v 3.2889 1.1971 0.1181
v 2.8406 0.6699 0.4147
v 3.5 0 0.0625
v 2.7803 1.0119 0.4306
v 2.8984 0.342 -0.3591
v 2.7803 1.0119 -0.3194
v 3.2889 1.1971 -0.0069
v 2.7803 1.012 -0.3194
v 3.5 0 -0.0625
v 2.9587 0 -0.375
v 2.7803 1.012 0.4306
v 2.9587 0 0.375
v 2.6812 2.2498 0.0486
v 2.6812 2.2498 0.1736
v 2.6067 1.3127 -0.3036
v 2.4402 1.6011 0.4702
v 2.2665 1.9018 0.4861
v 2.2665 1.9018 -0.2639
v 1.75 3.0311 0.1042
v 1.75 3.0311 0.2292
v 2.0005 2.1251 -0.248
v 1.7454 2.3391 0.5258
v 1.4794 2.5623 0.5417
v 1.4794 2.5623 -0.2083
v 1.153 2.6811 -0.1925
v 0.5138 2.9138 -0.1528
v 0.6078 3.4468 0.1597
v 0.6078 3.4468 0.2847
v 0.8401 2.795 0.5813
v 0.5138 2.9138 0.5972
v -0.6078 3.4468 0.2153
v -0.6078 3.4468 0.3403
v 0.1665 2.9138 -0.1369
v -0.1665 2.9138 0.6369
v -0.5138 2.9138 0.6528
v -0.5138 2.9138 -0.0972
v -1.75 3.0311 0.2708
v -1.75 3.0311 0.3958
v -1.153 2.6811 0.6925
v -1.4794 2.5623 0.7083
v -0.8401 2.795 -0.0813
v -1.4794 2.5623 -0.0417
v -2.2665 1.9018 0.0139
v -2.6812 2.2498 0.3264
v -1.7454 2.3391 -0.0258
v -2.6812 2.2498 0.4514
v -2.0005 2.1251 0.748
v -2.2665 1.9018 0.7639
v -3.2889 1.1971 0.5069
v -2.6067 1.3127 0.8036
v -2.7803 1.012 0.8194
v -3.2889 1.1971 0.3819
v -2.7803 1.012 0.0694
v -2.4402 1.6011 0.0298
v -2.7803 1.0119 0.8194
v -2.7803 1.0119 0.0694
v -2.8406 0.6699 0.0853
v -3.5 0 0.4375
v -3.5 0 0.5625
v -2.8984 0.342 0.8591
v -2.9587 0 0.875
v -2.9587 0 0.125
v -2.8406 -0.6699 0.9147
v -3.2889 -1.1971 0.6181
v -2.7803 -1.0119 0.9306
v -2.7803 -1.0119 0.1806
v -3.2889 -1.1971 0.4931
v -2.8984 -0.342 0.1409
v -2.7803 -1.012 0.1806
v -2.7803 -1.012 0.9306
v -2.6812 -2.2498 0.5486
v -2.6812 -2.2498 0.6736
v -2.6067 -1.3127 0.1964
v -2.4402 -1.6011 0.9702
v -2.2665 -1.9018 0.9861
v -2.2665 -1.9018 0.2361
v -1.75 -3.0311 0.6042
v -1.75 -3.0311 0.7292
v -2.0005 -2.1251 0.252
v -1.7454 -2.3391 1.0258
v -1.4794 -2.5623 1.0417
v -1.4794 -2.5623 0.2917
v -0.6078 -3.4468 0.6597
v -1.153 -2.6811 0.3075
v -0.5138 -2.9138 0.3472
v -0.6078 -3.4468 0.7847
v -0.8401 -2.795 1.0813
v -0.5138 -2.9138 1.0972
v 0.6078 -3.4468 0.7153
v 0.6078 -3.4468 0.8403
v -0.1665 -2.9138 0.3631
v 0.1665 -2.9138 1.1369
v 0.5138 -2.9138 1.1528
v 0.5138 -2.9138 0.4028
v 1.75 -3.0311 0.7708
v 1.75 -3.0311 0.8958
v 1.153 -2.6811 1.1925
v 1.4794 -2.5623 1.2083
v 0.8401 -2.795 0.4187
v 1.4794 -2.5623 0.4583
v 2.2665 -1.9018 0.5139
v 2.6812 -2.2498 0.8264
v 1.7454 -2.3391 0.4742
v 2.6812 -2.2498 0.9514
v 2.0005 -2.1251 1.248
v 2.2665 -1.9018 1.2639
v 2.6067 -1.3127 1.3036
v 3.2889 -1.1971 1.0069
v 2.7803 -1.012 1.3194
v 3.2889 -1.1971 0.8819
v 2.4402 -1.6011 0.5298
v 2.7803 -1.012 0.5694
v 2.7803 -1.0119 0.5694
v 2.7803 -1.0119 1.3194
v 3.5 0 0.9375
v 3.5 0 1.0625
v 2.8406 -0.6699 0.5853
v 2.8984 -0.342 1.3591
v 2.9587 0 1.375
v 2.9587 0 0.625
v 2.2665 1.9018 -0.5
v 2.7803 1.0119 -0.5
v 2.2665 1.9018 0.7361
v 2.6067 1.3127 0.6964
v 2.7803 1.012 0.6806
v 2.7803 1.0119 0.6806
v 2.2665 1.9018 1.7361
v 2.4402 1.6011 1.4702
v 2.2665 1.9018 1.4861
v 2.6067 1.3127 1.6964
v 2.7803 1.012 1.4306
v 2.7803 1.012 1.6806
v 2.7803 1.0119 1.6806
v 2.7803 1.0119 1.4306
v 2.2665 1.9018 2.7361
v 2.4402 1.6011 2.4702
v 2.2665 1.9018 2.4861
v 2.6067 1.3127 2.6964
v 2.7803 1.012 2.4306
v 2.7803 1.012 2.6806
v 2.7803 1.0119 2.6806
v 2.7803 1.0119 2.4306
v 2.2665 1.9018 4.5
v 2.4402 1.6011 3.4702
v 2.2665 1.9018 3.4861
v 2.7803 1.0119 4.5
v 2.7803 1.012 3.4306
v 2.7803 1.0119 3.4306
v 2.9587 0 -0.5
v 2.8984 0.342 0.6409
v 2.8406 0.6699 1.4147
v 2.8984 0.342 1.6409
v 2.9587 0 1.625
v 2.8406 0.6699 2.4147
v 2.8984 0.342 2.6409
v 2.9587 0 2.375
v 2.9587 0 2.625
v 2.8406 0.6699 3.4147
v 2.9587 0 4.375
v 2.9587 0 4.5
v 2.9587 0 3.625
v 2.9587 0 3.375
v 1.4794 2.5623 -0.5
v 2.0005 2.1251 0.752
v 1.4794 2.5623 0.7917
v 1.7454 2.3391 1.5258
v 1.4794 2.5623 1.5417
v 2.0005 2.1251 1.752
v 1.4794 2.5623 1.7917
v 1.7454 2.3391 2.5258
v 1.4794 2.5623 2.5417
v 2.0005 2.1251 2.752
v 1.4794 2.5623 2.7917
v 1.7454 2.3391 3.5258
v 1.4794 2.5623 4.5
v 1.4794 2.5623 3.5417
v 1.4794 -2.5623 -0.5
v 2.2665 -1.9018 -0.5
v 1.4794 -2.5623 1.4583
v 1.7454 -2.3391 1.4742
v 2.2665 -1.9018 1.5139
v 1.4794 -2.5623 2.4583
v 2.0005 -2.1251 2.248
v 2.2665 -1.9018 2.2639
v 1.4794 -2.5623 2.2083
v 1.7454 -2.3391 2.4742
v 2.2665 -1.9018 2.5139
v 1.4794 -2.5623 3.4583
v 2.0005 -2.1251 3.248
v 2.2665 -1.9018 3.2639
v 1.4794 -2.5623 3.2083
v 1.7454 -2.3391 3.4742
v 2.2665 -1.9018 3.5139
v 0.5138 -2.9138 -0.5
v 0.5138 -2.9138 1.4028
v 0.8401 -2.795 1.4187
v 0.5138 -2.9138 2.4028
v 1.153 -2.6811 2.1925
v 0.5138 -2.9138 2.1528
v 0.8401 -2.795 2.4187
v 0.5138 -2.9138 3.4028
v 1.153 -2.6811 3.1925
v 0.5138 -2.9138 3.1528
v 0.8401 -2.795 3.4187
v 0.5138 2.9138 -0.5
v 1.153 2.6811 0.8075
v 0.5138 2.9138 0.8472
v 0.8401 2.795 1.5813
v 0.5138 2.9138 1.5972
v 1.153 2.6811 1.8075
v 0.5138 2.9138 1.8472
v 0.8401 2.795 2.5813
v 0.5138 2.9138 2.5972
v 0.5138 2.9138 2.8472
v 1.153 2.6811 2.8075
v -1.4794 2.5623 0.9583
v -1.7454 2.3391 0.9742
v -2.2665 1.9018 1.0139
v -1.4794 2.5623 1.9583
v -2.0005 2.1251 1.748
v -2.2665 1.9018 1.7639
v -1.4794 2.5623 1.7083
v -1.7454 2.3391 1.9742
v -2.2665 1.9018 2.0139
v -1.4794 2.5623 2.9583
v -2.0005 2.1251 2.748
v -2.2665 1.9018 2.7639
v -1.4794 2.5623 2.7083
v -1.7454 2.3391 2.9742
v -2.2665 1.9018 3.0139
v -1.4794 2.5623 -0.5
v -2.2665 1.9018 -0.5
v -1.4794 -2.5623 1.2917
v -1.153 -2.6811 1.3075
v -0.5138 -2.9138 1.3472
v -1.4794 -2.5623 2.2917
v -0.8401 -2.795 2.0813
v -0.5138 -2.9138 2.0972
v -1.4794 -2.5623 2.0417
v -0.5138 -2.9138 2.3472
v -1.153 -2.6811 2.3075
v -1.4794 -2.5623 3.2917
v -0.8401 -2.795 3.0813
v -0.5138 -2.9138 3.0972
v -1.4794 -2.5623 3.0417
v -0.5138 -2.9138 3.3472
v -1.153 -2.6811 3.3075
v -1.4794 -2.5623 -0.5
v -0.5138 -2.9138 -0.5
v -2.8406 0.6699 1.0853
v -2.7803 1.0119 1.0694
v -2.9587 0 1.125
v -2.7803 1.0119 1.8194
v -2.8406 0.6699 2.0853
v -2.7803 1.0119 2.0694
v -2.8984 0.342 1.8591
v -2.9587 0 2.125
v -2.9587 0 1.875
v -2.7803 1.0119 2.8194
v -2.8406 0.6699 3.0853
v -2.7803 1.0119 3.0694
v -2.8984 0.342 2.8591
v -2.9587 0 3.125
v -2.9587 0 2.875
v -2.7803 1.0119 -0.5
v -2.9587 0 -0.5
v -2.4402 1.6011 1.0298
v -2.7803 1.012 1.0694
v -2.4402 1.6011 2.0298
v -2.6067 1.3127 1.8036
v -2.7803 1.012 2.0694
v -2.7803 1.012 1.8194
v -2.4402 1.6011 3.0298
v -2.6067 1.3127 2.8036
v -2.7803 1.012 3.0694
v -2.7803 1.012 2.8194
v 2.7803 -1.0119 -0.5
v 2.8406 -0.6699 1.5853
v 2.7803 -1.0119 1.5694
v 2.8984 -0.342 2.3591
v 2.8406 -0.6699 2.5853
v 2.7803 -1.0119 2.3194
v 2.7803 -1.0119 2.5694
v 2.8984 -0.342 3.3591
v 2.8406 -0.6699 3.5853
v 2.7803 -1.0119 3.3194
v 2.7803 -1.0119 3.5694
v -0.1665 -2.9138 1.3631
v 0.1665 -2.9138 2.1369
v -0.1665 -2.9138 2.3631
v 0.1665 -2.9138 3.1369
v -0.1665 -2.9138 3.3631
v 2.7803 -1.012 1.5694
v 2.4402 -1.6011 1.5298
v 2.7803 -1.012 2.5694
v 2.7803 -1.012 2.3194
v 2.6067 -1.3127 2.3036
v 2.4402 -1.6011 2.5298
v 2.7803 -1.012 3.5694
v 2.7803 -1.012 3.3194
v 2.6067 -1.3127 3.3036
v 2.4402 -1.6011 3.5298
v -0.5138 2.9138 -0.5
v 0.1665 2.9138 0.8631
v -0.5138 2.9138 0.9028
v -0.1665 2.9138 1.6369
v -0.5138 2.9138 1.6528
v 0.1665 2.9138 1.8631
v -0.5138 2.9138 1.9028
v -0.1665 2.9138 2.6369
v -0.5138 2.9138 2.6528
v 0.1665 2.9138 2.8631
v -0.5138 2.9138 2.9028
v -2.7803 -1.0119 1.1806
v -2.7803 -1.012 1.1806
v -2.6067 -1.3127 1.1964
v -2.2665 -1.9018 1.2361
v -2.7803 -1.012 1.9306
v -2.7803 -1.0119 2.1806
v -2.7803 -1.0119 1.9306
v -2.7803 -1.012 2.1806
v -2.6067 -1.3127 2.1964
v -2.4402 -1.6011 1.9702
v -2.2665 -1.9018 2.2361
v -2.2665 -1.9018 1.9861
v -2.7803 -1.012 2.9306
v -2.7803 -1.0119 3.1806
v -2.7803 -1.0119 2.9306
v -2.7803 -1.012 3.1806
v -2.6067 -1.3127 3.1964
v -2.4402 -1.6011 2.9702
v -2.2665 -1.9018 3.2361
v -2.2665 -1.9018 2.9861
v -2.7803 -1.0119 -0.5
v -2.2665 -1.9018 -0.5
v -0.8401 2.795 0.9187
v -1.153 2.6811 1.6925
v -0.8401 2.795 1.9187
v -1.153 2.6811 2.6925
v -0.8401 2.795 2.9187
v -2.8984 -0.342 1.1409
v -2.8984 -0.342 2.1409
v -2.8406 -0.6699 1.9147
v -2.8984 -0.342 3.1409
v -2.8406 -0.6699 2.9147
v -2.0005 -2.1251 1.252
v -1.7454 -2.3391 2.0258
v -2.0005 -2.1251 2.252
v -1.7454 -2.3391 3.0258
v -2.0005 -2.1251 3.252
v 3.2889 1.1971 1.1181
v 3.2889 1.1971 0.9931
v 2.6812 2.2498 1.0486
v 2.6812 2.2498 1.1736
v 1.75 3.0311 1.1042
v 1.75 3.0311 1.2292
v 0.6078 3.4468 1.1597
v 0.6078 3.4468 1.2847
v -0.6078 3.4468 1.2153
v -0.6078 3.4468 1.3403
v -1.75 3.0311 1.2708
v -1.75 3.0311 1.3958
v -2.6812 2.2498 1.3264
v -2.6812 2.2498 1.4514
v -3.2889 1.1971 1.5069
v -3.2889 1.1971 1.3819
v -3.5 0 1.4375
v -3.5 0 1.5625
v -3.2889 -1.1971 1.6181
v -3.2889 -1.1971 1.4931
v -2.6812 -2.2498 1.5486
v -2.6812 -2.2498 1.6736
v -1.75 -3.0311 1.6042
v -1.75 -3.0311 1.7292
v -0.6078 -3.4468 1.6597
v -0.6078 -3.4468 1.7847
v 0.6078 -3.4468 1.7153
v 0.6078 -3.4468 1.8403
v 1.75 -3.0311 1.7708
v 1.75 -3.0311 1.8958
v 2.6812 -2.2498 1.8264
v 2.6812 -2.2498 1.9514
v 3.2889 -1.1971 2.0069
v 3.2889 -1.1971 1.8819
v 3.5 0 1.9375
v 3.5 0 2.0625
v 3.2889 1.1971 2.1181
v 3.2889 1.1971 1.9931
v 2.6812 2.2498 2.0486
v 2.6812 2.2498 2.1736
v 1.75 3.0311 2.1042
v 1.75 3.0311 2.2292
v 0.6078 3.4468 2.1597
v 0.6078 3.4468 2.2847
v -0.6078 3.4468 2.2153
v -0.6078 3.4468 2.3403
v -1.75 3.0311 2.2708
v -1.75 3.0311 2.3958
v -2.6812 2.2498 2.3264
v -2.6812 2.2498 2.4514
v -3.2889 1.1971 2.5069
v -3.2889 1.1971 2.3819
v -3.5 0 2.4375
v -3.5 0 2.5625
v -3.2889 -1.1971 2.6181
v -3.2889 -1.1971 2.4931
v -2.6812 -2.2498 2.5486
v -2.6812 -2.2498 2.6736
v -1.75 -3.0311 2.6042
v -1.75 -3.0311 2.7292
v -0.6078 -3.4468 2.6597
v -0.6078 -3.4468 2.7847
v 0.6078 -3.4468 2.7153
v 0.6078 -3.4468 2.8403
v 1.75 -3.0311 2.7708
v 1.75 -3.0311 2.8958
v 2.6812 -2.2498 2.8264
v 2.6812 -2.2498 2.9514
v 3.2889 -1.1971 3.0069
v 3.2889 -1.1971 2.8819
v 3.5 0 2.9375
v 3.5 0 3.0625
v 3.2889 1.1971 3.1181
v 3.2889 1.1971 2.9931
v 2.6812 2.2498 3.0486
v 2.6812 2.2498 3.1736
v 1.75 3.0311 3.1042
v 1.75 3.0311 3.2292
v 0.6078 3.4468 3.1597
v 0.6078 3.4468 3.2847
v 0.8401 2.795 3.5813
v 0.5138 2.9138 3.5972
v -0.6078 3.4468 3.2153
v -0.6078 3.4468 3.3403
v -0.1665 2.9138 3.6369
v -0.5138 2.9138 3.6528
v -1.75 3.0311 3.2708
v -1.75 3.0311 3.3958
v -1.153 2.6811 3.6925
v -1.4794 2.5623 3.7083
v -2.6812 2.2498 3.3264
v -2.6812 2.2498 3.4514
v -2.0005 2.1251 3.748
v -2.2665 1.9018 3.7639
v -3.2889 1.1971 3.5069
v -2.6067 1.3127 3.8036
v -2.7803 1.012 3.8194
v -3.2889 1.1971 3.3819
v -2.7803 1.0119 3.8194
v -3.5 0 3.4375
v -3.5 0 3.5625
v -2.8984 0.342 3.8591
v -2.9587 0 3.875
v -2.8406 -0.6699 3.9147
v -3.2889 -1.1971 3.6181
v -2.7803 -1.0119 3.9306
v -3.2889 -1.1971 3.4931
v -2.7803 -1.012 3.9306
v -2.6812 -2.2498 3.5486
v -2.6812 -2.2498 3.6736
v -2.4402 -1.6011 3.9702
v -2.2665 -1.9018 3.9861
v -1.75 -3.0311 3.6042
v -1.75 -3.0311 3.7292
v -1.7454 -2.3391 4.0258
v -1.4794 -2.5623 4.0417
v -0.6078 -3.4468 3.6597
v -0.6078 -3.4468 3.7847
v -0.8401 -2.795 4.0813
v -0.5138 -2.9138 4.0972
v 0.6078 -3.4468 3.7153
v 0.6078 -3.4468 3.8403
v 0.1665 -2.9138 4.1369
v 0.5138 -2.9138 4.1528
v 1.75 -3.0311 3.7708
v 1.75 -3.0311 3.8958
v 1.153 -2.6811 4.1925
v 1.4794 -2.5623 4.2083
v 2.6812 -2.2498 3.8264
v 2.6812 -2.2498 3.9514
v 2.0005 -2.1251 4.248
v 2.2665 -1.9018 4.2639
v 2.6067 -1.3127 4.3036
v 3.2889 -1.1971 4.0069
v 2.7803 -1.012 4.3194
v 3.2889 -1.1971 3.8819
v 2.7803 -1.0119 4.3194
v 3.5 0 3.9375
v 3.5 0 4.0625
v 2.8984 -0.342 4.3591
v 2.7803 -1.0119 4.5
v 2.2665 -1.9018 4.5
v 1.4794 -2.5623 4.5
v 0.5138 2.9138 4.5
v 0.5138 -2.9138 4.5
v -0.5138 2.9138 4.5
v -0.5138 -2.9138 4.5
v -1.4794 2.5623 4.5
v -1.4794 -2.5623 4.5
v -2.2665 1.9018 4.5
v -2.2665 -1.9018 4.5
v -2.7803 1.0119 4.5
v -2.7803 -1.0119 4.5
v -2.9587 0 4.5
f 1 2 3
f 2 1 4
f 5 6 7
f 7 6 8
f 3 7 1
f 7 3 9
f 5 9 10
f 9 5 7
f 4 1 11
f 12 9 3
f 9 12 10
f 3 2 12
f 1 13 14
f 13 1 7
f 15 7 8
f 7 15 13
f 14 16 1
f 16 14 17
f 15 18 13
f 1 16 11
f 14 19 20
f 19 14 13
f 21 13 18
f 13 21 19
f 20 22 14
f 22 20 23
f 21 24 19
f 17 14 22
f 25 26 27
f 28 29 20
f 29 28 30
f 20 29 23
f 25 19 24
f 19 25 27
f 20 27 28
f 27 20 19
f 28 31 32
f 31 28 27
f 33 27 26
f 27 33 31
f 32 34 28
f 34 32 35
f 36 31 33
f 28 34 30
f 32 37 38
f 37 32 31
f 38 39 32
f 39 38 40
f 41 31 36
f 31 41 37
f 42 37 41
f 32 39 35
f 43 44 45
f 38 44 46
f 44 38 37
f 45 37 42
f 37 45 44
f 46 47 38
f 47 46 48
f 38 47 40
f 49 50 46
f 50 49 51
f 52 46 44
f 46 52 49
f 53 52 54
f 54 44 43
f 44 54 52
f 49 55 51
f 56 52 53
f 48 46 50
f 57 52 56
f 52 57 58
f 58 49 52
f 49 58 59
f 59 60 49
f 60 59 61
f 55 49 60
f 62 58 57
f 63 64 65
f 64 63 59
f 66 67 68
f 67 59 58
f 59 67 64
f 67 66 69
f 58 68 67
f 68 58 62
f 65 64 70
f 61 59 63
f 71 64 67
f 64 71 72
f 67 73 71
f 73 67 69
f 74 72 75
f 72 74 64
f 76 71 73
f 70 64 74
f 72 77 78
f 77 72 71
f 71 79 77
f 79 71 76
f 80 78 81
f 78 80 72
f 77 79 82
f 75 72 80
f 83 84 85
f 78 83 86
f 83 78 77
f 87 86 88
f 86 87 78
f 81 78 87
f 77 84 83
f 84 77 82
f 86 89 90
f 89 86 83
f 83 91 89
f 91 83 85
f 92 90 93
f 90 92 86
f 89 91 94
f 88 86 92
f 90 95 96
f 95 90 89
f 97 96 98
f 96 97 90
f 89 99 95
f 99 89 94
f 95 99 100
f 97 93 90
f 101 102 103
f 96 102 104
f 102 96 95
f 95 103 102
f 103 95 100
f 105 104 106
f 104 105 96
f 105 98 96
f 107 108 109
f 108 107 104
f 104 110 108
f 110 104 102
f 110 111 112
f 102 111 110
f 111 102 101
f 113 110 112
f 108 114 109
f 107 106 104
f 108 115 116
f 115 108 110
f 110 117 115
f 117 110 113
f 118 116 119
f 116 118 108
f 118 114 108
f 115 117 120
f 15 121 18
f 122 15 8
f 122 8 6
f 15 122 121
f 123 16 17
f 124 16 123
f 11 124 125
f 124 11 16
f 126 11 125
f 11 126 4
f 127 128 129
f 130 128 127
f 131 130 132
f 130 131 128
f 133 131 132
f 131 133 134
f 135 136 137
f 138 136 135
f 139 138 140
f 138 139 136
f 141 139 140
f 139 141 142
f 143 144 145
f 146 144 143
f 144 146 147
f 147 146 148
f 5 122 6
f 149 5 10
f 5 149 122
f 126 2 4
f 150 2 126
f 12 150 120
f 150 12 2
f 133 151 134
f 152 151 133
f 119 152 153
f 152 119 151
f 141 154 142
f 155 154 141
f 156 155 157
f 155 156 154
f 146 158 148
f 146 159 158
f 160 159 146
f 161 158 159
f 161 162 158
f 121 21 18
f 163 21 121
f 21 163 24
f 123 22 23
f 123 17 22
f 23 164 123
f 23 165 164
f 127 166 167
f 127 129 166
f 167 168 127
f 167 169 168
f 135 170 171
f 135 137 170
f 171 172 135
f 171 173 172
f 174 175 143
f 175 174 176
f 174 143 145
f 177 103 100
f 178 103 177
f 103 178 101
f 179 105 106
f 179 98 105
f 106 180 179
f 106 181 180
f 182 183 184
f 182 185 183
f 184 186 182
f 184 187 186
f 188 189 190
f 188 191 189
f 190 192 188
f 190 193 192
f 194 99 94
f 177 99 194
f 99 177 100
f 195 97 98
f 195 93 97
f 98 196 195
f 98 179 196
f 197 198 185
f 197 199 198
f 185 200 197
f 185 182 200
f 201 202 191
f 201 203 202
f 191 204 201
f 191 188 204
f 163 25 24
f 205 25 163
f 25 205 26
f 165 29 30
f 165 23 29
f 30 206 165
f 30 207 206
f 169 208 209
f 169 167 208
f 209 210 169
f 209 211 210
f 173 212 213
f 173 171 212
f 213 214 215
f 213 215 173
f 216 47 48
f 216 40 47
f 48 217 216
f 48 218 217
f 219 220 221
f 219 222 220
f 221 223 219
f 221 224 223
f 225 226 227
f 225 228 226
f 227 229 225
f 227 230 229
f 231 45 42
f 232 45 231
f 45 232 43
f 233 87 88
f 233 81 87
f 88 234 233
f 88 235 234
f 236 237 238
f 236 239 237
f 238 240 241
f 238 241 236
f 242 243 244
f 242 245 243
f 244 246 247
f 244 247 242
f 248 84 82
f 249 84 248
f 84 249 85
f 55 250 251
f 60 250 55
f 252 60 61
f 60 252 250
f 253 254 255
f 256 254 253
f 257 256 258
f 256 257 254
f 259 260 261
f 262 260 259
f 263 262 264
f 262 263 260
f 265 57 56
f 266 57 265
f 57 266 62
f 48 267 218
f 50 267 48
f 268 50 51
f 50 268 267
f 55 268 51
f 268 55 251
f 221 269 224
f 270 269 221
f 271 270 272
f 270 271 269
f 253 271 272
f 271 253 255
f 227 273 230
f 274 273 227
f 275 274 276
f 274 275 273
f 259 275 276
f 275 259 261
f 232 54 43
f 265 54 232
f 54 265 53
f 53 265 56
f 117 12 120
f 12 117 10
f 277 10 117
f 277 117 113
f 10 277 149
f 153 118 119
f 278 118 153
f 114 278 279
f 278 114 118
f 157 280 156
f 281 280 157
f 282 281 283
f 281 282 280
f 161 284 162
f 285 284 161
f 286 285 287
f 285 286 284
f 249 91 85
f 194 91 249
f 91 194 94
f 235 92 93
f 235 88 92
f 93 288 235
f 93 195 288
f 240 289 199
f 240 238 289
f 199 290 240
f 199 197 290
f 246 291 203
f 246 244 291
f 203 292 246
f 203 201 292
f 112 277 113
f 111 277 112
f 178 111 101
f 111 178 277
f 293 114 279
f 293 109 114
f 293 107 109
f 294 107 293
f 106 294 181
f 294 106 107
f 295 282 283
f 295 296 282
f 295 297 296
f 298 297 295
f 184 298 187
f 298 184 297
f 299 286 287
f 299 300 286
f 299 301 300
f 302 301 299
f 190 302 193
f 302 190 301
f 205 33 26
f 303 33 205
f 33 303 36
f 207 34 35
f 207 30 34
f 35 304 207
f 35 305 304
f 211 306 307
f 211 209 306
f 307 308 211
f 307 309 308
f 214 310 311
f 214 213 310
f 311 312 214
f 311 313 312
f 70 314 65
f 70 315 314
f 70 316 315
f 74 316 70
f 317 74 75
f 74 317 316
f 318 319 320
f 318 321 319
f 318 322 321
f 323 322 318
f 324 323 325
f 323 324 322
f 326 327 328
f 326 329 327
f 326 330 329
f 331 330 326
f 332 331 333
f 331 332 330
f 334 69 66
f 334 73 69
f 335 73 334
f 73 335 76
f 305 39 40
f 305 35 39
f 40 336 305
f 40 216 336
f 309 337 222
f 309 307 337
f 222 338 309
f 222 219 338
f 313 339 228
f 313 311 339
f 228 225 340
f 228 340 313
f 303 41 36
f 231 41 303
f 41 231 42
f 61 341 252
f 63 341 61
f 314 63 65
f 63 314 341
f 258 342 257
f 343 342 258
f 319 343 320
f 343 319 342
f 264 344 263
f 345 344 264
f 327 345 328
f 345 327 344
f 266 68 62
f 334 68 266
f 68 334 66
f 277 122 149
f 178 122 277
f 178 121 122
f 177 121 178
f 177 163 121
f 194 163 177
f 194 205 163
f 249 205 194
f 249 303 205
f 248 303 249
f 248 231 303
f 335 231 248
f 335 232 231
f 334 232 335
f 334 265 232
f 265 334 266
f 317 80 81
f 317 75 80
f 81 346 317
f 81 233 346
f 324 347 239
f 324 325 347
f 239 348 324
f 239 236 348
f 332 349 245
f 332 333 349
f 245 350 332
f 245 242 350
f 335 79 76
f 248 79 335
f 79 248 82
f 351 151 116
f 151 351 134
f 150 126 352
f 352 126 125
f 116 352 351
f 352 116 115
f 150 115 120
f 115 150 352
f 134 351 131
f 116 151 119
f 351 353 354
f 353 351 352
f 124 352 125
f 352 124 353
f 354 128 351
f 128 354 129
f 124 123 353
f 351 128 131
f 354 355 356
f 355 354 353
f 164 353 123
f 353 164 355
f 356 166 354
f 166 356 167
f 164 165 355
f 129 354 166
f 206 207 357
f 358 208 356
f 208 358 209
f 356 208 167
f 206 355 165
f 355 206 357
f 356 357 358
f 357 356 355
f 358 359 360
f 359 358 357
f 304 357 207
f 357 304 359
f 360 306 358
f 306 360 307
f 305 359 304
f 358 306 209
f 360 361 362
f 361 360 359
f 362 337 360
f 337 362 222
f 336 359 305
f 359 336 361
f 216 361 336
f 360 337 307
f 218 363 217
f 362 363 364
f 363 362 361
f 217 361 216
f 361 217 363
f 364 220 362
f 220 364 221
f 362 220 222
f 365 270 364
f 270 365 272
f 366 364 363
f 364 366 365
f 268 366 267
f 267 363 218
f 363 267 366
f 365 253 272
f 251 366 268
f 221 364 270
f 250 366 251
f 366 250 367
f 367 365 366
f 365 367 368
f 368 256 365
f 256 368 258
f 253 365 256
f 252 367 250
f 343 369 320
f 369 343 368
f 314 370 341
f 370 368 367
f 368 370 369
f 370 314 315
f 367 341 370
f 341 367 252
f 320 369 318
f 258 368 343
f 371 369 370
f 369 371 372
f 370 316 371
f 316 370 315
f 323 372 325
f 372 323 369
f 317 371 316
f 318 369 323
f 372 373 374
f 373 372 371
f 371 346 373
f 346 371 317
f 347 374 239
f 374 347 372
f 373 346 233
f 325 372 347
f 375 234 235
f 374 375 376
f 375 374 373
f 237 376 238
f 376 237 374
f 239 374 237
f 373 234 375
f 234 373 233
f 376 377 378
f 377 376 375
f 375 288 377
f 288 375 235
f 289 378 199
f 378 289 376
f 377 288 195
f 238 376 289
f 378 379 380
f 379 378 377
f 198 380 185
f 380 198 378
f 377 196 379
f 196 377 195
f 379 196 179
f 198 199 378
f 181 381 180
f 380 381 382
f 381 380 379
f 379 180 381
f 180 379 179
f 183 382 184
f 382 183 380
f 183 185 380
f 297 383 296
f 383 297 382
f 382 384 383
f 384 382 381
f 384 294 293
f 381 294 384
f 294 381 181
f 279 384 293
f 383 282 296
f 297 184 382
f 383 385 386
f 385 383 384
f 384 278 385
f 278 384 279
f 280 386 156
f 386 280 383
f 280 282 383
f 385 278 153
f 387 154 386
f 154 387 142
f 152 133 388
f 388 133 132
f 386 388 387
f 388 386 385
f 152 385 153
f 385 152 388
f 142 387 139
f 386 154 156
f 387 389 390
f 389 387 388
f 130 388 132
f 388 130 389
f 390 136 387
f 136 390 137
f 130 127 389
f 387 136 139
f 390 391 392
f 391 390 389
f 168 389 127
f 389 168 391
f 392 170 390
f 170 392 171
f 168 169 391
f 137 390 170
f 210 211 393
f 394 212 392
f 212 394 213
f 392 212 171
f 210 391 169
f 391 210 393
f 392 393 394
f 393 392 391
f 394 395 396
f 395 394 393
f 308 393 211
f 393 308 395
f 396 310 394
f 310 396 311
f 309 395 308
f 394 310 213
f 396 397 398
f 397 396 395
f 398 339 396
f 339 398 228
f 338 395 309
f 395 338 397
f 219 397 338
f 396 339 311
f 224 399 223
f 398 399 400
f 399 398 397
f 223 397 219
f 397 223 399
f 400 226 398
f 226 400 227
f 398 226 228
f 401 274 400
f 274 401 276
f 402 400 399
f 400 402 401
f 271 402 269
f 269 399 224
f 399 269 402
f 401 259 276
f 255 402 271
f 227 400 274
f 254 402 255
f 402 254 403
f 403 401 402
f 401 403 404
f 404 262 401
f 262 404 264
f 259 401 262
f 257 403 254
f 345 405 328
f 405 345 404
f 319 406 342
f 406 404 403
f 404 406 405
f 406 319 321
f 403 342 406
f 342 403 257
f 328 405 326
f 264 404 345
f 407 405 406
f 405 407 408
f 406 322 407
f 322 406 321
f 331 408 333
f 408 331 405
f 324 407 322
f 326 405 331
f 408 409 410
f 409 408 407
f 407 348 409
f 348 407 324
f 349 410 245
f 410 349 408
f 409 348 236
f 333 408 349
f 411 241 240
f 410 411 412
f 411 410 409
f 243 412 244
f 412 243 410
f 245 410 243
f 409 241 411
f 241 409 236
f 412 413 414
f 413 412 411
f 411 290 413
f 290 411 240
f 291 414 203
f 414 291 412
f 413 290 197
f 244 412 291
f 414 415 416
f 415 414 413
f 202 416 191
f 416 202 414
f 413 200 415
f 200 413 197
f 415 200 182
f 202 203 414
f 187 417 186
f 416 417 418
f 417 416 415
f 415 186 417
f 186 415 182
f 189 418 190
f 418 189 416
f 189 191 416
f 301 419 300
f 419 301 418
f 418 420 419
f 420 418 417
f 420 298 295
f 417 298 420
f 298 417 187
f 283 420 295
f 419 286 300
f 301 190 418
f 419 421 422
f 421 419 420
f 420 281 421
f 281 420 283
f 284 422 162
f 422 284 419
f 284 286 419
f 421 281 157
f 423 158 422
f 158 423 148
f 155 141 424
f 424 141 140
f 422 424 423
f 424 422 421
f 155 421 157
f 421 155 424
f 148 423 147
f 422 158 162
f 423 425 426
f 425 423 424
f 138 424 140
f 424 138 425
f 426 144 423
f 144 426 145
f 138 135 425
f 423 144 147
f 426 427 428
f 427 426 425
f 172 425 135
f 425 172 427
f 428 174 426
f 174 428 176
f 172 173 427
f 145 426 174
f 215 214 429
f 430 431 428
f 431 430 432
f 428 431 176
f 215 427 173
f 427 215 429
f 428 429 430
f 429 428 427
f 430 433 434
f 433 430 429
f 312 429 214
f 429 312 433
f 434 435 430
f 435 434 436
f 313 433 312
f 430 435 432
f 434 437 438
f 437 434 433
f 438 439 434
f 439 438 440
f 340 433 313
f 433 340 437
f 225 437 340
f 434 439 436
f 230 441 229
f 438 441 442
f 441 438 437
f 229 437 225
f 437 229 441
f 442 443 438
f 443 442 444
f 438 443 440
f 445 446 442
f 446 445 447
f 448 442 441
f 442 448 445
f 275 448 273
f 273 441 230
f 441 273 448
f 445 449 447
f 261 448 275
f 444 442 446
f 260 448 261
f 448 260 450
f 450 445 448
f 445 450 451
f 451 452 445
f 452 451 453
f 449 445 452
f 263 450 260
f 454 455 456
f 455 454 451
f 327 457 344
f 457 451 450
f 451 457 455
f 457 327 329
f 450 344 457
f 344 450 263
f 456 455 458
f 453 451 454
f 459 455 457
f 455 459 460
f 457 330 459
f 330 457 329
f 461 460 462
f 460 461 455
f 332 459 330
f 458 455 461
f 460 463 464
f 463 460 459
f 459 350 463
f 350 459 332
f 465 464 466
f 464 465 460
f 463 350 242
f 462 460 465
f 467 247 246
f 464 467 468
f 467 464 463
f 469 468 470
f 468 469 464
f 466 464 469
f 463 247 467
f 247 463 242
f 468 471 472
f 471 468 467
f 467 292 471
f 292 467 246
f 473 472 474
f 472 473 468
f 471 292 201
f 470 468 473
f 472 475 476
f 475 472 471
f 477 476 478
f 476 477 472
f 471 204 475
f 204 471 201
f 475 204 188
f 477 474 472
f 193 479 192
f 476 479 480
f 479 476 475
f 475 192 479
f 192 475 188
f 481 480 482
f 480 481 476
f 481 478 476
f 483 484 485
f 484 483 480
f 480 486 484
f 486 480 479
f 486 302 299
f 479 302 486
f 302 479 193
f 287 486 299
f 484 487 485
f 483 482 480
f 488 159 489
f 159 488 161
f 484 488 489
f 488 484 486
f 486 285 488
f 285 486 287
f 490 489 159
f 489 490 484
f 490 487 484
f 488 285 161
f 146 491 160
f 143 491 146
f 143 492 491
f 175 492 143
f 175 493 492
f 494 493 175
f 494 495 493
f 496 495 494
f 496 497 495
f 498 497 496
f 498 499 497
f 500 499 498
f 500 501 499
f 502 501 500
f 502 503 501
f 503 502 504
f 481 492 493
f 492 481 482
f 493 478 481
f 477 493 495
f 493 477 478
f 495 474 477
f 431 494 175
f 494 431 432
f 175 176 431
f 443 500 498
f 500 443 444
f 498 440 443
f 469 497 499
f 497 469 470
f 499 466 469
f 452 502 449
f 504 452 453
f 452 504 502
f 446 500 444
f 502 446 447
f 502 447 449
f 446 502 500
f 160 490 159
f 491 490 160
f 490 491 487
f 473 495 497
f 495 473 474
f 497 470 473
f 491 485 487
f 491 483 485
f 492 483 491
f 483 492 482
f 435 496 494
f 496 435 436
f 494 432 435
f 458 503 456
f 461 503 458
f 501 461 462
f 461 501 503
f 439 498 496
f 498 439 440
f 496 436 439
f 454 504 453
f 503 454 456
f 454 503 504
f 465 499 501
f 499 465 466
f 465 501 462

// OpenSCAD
// Metric Screw Thread Library
// by Maximilian Karl <karlma@in.tum.de> (2012)
// 
//
// only use module thread(P,D,h,step)
// with the parameters:
// P    - screw thread pitch
// D    - screw thread major diameter
// h    - screw thread height
// step - step size in degree
// 

module screwthread_triangle(P) {
	difference() {
		translate([-sqrt(3)/3*P+sqrt(3)/2*P/8,0,0])
		rotate([90,0,0])
		cylinder(r=sqrt(3)/3*P,h=0.00001,$fn=3,center=true);

		translate([0,-P/2,-P/2])
		cube([P,P,P]);
	}
}

module screwthread_onerotation(P,D_maj,step) {
	H = sqrt(3)/2*P;
	D_min = D_maj - 5*sqrt(3)/8*P;

	for(i=[0:step:360-step])
	hull()
		for(j = [0,step])
		rotate([0,0,(i+j)])
		translate([D_maj/2,0,(i+j)/360*P])
		screwthread_triangle(P);

	translate([0,0,P/2])
	cylinder(r=D_min/2,h=2*P,$fn=360/step,center=true);
}

module thread(P,D,h,step) {
	for(i=[0:h/P])
	translate([0,0,i*P])
	screwthread_onerotation(P,D,step);
}


// example
thread(1.0,7.0,3,20);
